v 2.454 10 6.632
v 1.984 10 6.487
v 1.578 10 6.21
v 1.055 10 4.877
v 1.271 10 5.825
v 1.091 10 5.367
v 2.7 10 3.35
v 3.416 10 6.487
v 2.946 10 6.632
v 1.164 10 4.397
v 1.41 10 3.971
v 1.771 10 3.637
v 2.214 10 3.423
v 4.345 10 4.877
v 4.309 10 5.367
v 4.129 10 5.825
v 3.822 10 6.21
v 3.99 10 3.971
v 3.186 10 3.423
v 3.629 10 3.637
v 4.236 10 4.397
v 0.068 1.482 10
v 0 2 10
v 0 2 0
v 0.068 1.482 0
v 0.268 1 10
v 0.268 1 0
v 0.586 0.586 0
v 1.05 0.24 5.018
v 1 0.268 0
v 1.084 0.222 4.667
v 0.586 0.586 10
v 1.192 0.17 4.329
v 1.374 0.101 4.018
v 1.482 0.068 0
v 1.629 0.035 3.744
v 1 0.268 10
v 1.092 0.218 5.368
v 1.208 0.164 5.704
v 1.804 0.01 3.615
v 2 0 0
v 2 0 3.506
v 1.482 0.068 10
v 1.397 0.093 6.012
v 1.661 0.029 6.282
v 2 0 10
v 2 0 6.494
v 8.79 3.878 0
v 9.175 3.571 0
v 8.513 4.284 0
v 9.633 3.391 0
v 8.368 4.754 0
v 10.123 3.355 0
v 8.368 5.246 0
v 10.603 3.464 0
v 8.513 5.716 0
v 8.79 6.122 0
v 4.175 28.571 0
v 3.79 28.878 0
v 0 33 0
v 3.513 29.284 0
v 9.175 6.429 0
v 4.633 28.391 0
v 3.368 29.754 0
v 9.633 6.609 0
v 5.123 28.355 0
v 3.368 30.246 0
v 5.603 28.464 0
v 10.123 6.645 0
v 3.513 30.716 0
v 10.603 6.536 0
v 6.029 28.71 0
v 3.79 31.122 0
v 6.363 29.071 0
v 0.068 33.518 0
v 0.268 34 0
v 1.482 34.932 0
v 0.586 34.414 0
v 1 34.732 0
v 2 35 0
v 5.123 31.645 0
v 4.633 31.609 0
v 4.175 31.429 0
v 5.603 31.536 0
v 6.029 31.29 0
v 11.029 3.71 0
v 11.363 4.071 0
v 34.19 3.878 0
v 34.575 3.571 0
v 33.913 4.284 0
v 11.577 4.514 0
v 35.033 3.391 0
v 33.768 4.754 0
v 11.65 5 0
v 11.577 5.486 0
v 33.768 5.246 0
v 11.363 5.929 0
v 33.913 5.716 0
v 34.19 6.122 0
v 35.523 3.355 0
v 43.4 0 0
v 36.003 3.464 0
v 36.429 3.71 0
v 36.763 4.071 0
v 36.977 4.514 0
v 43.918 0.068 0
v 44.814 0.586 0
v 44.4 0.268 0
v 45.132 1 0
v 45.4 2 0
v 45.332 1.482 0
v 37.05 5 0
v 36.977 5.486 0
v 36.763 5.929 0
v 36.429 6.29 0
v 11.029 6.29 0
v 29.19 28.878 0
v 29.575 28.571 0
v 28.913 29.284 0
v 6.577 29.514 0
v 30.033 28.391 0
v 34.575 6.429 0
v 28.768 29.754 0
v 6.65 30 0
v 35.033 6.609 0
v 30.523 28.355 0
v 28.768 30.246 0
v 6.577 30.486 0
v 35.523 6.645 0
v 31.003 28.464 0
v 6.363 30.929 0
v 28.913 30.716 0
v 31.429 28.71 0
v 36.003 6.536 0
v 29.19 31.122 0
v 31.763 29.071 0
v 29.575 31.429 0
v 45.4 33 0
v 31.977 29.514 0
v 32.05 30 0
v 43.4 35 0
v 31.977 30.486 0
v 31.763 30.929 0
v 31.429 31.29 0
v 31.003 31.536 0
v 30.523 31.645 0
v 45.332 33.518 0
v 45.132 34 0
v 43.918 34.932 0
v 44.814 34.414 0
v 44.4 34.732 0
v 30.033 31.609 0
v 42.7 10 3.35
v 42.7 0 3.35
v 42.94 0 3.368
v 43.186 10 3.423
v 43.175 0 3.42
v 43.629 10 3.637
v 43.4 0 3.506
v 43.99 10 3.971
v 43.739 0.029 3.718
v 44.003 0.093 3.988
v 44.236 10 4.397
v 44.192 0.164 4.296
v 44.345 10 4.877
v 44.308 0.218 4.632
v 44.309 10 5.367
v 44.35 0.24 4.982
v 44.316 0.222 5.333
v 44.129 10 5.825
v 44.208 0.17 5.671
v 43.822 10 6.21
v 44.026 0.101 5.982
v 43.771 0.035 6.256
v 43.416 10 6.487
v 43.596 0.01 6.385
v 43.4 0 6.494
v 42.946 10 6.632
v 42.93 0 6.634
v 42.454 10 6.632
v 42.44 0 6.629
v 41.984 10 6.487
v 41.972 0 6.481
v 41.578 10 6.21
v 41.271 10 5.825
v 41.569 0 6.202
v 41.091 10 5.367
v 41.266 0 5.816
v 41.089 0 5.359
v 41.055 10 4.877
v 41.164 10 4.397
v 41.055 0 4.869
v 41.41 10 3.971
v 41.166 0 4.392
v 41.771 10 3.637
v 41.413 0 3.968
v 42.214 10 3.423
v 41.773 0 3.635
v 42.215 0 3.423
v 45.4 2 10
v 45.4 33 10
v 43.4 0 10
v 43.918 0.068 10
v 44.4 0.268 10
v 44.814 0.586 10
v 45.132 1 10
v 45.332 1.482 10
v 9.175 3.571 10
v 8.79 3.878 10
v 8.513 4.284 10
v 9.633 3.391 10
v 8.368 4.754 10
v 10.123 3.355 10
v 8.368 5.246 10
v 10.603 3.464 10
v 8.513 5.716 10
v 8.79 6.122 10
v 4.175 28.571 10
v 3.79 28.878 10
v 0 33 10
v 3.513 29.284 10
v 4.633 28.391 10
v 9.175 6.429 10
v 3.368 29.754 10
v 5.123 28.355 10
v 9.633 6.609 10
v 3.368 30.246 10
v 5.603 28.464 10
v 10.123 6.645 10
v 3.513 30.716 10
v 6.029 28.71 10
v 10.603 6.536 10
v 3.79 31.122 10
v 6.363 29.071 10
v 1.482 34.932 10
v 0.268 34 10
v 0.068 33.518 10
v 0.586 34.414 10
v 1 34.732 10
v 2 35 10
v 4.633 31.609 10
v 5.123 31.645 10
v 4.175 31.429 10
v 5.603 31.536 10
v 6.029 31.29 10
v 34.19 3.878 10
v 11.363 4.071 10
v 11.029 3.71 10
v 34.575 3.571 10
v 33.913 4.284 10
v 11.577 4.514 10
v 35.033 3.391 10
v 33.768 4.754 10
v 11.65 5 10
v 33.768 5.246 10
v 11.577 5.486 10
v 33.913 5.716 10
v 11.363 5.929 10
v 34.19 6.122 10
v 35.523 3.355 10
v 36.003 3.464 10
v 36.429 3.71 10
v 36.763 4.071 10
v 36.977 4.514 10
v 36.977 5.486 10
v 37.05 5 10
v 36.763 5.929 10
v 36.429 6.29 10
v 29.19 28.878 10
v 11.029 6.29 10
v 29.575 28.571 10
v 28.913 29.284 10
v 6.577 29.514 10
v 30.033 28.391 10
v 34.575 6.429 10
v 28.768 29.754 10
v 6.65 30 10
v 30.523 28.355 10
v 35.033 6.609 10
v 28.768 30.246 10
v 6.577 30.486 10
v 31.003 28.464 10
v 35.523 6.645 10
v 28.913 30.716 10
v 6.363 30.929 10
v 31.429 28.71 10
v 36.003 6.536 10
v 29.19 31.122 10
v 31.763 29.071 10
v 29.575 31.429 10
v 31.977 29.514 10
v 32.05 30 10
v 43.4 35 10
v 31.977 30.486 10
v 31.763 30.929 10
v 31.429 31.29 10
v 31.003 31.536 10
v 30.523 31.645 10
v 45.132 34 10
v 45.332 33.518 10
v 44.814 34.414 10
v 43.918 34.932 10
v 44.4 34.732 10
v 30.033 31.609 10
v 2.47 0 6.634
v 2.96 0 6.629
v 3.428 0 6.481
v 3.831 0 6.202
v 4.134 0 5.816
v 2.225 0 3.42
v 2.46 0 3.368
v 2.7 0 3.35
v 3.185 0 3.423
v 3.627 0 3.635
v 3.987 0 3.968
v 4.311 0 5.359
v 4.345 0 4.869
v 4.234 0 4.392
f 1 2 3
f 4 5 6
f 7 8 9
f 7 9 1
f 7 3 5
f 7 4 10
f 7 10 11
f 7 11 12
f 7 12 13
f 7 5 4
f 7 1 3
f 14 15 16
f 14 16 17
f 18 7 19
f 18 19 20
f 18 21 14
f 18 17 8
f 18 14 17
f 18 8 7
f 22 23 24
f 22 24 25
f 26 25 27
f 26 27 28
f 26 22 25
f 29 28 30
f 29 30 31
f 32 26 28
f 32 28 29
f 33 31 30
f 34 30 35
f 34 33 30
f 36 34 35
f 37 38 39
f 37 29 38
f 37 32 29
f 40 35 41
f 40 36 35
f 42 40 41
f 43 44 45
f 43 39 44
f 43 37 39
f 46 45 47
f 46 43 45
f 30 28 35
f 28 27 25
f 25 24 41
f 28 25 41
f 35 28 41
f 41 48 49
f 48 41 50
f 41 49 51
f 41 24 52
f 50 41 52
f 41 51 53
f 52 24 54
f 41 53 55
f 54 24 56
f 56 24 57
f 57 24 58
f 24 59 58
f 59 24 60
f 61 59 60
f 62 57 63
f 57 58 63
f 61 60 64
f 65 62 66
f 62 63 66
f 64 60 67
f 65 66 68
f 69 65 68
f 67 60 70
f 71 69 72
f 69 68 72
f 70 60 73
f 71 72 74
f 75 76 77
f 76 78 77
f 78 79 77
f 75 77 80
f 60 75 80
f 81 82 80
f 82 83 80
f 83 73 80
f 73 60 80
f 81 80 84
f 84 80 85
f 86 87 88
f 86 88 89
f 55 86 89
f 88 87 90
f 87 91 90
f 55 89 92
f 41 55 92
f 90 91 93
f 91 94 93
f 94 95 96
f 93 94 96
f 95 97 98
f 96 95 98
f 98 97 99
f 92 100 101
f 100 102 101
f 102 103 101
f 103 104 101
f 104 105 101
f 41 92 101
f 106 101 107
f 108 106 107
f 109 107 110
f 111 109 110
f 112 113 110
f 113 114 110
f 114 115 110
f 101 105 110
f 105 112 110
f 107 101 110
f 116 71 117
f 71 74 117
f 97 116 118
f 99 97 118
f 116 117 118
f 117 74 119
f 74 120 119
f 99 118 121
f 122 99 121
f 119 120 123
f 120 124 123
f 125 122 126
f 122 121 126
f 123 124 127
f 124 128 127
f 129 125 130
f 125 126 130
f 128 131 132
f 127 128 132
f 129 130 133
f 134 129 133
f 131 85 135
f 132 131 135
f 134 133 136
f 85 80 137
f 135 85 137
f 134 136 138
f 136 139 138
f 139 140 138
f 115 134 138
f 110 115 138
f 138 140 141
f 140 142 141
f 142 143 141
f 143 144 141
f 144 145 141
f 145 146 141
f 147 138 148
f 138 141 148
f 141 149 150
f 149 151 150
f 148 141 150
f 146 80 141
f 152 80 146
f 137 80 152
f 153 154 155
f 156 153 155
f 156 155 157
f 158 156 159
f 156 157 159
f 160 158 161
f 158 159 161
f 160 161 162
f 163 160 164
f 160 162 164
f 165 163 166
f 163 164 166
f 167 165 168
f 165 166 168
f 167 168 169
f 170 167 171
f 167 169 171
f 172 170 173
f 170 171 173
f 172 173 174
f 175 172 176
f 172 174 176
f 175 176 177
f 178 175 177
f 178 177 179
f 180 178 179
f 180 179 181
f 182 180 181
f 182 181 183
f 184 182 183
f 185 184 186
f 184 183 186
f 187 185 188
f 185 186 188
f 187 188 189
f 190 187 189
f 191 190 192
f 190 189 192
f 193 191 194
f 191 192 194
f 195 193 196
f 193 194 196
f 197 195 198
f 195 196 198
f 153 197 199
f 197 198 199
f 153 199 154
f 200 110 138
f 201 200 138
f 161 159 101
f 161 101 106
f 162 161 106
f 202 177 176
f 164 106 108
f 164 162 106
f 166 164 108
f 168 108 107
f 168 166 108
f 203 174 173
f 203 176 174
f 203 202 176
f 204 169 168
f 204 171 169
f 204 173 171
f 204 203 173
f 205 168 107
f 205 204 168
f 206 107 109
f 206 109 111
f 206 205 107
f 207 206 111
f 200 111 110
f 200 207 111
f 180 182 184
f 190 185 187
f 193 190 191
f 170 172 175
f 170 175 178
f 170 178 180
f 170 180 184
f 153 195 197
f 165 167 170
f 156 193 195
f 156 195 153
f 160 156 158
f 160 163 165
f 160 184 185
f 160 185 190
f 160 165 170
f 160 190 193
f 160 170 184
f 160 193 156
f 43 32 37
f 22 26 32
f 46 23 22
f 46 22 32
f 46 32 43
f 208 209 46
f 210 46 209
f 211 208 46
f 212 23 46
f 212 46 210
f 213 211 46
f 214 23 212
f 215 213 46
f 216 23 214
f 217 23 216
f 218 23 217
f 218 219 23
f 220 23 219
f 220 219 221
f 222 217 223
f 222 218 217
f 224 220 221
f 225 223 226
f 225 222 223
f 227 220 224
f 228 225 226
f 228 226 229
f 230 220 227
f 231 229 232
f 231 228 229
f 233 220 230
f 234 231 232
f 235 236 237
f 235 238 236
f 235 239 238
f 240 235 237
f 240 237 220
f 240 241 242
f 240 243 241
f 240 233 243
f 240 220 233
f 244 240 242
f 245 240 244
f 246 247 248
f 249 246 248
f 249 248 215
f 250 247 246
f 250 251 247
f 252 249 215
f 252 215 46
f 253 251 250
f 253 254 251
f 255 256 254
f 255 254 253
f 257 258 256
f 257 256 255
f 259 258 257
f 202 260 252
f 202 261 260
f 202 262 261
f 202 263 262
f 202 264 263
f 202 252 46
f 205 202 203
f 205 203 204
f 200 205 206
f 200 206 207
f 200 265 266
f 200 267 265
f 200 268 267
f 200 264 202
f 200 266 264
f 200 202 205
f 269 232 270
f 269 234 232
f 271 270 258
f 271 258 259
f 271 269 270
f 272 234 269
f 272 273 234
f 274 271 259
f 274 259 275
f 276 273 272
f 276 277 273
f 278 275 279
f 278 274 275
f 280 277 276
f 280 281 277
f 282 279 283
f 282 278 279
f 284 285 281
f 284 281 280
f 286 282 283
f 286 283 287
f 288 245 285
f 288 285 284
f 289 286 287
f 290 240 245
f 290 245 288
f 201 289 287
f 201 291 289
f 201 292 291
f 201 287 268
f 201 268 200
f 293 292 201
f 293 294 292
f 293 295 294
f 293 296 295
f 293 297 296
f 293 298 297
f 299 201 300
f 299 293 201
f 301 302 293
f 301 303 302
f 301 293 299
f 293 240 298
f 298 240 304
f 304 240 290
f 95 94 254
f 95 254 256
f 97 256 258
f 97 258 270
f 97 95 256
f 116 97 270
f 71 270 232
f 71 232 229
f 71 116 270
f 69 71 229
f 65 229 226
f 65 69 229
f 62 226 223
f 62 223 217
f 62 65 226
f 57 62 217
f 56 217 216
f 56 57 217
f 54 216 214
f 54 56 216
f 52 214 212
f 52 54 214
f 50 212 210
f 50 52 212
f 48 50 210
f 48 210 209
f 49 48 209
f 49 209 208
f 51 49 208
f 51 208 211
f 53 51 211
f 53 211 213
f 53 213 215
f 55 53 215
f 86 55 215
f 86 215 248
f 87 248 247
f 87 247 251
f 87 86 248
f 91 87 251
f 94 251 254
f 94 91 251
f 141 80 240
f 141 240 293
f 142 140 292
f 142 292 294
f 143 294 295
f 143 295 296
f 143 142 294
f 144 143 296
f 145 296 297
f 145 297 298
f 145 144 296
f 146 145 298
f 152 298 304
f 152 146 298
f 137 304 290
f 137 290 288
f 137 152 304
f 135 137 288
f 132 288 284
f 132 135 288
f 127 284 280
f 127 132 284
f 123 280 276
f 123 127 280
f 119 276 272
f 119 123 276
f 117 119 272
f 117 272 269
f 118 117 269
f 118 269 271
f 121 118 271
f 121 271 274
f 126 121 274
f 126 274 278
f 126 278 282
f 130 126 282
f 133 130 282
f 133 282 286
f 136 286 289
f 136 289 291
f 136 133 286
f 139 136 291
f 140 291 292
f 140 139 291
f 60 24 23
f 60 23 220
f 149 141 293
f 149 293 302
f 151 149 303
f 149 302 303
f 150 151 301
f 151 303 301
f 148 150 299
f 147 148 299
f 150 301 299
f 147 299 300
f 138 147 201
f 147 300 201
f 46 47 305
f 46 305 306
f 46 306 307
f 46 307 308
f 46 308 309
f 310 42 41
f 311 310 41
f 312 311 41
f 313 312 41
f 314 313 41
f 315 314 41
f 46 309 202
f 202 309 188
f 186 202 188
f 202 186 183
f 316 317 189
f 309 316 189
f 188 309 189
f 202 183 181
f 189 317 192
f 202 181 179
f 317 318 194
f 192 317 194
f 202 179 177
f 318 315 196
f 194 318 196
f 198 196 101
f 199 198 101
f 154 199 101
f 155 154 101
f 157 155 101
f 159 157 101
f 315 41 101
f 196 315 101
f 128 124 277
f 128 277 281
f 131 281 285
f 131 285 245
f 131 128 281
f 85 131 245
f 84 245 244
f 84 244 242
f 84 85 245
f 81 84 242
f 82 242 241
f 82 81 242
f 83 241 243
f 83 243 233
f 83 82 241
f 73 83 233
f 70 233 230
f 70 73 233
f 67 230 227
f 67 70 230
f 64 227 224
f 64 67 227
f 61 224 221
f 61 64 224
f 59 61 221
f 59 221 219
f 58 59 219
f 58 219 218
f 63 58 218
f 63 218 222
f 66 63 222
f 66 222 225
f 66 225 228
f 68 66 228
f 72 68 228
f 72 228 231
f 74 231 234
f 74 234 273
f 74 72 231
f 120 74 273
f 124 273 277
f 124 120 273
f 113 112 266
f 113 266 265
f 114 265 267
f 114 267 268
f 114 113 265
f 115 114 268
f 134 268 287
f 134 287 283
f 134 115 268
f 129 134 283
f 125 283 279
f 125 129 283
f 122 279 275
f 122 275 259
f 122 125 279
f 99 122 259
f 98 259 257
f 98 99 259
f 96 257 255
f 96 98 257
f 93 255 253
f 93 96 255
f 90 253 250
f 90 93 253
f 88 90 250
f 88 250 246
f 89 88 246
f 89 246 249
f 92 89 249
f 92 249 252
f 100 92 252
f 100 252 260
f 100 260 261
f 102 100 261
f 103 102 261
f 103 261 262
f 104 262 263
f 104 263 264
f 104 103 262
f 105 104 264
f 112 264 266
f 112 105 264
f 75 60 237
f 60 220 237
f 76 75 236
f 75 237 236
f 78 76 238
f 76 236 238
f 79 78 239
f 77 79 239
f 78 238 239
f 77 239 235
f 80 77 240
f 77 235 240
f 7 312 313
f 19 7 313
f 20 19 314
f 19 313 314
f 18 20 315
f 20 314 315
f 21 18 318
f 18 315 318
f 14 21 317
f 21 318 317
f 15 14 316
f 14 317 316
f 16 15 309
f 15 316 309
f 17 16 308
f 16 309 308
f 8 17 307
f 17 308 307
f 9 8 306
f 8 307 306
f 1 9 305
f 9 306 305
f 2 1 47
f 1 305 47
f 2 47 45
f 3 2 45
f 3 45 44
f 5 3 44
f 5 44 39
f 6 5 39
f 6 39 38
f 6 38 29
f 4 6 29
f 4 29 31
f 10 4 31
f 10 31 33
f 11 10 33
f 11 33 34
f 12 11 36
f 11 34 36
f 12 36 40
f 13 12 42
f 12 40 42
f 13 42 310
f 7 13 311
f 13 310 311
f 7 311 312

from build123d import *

# Parameters (mm, degrees)
SKETCH_1_W          = 45.4
SKETCH_1_H          = 35
SKETCH_1_R          = 1.65
EXTRUDE_1_DEPTH     = 10
FILLET_1_R          = 2
SKETCH_2_R          = 1.65
CUT_EXTRUDE_1_DEPTH = 10


with BuildPart() as part:
    # ｽｹｯﾁ1 → ﾎﾞｽ - 押し出し1 (new body)
    with BuildSketch(Plane.XY):
        with Locations((22.7, 17.5)):
            Rectangle(SKETCH_1_W, SKETCH_1_H)
        with Locations((10, 5)):
            Circle(SKETCH_1_R, mode=Mode.SUBTRACT)
        with Locations((35.4, 5)):
            Circle(SKETCH_1_R, mode=Mode.SUBTRACT)
        with Locations((5, 30)):
            Circle(SKETCH_1_R, mode=Mode.SUBTRACT)
        with Locations((30.4, 30)):
            Circle(SKETCH_1_R, mode=Mode.SUBTRACT)
    extrude(amount=EXTRUDE_1_DEPTH)

    # ﾌｨﾚｯﾄ1
    fillet_1_edges = [part.edges().sort_by_distance(p)[0] for p in [
        (0, 35, 5),
        (45.4, 35, 5),
        (45.4, 0, 5),
        (0, 0, 5),
    ]]
    fillet(fillet_1_edges, radius=FILLET_1_R)

    # ｽｹｯﾁ2 → ｶｯﾄ - 押し出し1 (cut)
    with BuildSketch(Plane.XZ):
        with Locations(Location((2.7, 5, 0), (0, 0, 270))):
            Circle(SKETCH_2_R)
        with Locations(Location((42.7, 5, 0), (0, 0, 270))):
            Circle(SKETCH_2_R)
    extrude(amount=-CUT_EXTRUDE_1_DEPTH, mode=Mode.SUBTRACT)


solid = part.part
